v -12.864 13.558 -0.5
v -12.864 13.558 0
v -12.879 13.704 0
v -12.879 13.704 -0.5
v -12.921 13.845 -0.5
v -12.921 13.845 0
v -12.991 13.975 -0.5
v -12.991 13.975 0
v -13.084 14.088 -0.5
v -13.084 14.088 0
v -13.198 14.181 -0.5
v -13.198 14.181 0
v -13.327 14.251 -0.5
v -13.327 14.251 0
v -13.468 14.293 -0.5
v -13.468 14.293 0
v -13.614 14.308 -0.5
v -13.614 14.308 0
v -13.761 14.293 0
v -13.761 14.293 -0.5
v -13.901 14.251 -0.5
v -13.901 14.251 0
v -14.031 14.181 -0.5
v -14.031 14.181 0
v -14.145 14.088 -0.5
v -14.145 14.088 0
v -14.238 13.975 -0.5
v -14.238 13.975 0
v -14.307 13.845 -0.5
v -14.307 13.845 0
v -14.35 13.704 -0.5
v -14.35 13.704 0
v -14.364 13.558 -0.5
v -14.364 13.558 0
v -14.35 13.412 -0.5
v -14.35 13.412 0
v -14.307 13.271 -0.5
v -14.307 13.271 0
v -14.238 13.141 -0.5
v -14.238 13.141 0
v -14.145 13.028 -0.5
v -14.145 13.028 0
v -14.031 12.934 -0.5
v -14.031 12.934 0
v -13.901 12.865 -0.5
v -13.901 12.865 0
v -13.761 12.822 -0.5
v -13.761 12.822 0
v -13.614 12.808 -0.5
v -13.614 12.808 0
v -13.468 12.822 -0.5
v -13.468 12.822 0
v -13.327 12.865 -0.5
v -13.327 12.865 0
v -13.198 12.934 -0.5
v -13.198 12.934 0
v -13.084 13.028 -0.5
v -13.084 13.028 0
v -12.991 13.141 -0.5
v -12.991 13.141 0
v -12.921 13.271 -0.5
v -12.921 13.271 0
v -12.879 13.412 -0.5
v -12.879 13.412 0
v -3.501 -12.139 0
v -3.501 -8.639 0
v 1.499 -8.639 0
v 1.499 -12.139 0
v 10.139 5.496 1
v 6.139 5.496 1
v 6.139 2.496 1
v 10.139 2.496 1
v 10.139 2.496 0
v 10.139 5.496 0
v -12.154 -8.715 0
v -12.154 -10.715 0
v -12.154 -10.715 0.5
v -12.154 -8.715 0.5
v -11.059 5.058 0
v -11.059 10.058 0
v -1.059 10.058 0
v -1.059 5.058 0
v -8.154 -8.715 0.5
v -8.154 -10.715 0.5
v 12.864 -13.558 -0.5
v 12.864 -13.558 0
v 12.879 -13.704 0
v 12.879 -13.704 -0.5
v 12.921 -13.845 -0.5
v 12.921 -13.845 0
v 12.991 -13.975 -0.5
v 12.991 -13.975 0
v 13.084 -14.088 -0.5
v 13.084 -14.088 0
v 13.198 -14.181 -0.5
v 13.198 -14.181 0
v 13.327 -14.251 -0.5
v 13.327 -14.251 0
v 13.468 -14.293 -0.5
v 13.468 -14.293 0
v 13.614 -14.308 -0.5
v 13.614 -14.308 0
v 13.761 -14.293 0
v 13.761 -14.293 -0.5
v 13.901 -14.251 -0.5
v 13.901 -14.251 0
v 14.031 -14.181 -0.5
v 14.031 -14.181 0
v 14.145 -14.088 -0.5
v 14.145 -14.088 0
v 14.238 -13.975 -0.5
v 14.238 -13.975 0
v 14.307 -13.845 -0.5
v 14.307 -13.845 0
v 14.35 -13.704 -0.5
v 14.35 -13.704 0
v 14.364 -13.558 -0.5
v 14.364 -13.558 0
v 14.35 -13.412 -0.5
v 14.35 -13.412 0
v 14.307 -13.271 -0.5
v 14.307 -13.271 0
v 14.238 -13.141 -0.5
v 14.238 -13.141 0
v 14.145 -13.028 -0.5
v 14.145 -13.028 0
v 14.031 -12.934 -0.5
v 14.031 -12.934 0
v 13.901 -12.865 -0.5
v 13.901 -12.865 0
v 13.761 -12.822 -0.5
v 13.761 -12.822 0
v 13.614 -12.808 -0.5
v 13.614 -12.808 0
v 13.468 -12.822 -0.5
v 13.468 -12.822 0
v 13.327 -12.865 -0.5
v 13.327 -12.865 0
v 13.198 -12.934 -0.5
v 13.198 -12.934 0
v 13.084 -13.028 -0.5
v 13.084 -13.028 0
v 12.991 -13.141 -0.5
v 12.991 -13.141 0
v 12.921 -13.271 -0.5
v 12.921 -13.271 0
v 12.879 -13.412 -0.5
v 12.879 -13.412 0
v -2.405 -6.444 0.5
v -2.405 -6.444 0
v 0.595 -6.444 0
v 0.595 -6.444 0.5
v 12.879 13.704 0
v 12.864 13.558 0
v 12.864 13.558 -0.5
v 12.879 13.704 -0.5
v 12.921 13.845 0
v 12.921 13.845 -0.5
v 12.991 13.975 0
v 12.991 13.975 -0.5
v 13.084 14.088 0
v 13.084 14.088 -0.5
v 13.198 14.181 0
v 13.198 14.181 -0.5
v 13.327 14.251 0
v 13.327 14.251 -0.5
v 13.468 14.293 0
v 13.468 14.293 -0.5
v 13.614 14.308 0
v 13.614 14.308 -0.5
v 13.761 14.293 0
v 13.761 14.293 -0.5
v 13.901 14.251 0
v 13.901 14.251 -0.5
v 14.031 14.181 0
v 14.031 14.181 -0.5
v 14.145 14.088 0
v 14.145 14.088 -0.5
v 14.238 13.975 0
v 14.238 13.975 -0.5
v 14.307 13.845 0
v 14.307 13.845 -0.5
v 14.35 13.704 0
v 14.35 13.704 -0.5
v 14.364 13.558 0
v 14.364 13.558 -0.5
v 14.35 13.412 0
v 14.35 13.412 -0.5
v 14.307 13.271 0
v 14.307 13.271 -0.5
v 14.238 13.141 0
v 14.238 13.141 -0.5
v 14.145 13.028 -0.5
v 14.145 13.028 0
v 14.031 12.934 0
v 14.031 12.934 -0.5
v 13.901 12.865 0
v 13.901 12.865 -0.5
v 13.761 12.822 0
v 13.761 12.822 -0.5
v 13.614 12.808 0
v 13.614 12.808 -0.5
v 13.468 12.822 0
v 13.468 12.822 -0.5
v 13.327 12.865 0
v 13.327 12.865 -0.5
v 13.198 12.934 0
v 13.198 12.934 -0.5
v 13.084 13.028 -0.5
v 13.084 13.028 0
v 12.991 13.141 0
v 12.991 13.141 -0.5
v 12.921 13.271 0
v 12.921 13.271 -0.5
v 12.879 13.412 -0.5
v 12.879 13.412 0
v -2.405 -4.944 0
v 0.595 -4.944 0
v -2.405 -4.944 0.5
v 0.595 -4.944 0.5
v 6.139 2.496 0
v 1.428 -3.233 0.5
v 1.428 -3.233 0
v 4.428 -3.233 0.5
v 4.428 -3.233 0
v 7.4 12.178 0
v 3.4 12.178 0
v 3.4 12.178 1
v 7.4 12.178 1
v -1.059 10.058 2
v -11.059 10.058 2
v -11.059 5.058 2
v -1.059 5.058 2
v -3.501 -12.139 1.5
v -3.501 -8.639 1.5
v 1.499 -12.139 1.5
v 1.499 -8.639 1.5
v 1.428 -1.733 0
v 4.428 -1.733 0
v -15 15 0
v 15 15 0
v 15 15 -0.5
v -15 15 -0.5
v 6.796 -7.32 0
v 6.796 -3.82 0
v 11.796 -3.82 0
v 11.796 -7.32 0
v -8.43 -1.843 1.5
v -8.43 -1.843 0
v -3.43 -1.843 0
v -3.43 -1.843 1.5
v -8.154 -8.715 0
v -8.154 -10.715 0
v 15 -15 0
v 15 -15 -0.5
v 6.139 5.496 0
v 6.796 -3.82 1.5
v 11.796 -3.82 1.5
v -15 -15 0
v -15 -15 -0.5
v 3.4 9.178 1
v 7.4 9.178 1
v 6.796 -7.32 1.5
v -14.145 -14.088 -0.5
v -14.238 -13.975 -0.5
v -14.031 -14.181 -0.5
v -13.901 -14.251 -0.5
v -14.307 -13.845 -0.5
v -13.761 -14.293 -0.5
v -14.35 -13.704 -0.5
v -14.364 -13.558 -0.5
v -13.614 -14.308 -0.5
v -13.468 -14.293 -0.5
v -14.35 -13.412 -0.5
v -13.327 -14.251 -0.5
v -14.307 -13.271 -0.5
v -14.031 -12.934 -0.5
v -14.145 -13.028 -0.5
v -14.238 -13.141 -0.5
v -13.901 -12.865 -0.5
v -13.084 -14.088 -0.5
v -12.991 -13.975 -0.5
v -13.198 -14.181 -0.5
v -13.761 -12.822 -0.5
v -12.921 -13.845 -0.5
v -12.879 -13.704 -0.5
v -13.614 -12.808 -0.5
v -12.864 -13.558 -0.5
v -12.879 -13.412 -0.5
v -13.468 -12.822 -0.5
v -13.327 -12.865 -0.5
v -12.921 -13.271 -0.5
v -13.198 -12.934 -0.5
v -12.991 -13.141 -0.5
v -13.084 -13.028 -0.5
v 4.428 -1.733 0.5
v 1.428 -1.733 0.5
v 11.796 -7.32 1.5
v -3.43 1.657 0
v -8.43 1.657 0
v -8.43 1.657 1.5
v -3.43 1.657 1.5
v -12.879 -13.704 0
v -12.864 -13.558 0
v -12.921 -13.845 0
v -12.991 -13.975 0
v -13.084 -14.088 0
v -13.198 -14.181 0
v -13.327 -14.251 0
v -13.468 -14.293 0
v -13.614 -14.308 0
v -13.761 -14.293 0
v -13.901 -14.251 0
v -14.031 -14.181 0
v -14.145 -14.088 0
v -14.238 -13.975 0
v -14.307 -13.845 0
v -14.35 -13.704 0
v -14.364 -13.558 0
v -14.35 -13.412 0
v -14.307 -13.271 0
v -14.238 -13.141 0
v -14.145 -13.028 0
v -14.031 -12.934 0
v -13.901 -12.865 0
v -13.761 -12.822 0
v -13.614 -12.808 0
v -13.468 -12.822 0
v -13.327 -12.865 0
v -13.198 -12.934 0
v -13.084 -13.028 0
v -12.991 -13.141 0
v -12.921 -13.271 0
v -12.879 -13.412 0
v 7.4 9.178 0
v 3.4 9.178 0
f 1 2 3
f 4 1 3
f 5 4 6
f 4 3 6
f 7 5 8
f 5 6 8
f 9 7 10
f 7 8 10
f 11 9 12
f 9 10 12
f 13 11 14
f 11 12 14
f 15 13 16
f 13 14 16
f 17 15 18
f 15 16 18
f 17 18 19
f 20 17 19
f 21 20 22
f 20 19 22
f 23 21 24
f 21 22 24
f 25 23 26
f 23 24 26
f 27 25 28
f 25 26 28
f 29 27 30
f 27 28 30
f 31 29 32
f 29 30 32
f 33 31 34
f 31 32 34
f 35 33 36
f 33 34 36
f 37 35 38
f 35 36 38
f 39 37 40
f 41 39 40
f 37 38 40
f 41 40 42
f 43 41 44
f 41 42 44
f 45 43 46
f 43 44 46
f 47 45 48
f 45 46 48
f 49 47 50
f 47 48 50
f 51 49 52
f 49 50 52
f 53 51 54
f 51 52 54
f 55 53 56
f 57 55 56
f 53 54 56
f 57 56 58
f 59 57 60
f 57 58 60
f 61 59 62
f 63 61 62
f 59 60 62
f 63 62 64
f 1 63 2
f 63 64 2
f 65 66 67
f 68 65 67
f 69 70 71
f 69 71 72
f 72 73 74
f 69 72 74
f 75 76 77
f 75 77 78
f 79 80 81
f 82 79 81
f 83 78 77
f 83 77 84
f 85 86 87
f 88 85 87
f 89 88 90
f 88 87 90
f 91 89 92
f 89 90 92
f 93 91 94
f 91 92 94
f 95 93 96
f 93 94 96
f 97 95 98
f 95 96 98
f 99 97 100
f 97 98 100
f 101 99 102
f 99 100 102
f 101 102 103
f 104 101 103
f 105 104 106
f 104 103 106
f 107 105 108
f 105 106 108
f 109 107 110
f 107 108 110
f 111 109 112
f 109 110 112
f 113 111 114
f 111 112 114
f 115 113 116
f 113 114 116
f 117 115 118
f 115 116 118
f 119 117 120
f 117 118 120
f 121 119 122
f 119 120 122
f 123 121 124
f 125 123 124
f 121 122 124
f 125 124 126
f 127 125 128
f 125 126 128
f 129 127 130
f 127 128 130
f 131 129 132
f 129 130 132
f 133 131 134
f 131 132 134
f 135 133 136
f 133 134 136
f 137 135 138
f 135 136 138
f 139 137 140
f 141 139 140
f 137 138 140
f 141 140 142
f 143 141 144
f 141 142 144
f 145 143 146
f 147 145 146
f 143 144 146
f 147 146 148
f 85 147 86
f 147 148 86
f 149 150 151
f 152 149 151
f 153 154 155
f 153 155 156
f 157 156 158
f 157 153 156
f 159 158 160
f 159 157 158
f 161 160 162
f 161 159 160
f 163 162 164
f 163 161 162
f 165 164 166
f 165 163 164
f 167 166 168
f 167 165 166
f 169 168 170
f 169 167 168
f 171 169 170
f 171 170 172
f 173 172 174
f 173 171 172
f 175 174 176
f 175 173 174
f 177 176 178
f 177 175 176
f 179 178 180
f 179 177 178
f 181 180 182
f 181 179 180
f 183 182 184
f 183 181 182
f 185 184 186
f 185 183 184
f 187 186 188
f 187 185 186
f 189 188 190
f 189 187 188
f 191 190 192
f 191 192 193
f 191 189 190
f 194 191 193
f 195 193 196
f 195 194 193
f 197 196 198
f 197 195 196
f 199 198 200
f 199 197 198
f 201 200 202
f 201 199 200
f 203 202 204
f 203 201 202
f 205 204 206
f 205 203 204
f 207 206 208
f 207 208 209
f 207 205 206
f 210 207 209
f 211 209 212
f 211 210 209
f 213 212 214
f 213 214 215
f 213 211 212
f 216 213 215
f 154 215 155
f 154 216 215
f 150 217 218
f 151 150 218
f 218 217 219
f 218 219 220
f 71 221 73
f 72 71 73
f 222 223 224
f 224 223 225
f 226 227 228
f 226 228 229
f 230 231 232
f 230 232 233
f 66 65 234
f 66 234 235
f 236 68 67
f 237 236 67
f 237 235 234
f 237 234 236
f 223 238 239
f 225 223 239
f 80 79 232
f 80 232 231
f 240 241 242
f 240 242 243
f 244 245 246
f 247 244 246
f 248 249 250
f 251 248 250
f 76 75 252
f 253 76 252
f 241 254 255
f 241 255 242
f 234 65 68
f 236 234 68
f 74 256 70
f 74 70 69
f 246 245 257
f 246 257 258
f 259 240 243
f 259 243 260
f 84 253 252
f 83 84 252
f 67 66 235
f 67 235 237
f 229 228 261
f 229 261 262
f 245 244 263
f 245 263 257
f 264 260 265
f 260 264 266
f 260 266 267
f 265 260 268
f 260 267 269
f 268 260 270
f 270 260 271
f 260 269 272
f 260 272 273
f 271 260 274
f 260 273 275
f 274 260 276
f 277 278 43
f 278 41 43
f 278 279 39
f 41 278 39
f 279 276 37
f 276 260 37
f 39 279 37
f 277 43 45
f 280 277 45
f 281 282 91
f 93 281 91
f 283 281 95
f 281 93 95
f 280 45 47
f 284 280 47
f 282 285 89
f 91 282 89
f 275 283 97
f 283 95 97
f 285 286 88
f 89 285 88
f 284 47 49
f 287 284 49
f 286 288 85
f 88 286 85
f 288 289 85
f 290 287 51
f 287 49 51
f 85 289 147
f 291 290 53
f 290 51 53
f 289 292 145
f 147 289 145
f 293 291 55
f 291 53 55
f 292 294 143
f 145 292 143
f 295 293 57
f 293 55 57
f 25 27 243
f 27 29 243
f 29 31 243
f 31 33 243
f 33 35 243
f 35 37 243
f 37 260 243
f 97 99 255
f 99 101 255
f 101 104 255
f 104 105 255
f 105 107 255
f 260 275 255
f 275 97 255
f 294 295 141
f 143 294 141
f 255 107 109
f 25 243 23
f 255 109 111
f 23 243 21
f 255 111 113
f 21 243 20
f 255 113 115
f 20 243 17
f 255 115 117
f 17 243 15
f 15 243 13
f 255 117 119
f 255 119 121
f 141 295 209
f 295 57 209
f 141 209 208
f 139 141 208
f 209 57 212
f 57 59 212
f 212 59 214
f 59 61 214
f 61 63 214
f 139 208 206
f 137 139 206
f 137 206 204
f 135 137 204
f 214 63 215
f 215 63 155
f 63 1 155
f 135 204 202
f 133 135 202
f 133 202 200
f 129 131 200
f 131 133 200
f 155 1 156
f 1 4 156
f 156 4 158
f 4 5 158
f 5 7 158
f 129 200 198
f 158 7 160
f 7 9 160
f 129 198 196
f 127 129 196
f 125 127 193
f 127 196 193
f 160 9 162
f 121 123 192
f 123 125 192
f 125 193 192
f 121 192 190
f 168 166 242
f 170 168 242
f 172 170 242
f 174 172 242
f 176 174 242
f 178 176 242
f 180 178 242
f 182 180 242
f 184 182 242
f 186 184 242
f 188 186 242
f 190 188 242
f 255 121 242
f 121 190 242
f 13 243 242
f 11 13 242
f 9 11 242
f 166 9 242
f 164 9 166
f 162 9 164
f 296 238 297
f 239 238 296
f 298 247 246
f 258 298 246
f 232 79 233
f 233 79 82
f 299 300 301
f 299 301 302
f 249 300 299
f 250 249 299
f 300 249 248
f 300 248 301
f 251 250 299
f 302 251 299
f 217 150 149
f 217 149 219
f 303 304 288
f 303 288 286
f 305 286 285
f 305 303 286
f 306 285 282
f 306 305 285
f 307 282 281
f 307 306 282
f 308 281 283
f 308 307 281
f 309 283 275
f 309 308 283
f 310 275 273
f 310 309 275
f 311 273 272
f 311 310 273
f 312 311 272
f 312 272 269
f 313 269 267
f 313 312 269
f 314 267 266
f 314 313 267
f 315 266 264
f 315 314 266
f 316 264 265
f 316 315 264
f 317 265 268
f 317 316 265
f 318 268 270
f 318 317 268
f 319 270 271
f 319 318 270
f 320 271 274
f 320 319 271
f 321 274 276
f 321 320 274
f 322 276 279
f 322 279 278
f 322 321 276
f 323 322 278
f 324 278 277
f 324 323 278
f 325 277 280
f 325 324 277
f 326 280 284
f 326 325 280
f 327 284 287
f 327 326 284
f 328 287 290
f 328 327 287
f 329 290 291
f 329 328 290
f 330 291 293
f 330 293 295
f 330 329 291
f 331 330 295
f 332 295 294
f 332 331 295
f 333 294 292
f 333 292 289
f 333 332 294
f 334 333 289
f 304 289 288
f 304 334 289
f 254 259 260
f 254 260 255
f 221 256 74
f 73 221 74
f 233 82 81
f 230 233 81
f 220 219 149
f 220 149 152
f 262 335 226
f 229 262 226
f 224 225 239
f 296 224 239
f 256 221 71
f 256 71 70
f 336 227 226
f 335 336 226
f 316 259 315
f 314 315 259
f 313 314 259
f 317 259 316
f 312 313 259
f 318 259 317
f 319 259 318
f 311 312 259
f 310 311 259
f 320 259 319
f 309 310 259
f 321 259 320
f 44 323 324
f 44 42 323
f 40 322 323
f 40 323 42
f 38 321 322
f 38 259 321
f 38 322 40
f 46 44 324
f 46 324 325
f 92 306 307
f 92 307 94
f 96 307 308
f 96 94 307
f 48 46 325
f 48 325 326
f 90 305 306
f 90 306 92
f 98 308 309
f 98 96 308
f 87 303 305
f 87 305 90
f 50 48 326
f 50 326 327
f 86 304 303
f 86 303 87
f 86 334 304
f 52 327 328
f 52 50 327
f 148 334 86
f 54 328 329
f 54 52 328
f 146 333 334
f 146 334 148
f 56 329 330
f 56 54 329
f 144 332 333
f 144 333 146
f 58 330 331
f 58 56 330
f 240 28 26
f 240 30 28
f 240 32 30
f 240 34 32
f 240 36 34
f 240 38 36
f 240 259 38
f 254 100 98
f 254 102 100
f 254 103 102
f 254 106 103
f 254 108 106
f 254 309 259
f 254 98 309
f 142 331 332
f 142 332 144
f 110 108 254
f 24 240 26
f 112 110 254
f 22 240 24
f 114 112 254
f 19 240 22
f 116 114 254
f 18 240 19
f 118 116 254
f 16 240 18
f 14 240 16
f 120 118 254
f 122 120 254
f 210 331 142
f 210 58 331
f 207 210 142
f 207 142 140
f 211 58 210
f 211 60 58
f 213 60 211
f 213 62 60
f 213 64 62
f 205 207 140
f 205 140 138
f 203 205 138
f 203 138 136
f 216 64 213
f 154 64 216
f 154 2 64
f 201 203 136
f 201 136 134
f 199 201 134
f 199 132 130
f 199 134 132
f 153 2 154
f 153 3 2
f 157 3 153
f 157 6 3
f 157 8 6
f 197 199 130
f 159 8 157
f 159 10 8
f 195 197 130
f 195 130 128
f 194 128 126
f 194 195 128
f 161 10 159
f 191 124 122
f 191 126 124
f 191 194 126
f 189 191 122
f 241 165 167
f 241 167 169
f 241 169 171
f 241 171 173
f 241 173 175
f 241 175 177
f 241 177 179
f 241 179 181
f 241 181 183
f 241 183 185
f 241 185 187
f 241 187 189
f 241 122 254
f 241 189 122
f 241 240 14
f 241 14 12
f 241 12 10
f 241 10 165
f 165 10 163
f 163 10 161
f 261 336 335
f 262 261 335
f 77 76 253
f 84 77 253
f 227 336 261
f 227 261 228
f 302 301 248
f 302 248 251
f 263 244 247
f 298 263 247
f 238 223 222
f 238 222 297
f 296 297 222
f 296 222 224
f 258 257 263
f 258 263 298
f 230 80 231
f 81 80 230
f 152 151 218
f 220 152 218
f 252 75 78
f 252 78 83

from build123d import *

# Parameters (mm, degrees)
F0_W      = 4
F0_H      = 2
F0_W_2    = 5
F0_H_2    = 3.5
F0_W_3    = 3
F0_H_3    = 1.5
F0_R      = 0.75
F0_W_4    = 10
F0_H_4    = 5
F0_H_5    = 3
F1_DEPTH  = 0.5
F2_DEPTH  = 0.5
F7_DEPTH  = 2
F8_DEPTH  = 1.5
F9_DEPTH  = 1
F10_DEPTH = 0.5


# Not quite as in the source:
# - the program builds the solid bodies; features that only make, move or delete a surface that nothing else refers to are left out


with BuildPart() as f1:
    # F0 (on Top) → F1 (new body)
    with BuildSketch(Plane.XY):
        Polygon((15, 15), (0, 15), (-15, 15), (-15, 0), (-15, -15), (15, -15), (15, 0), align=None)
        with Locations((-10.1540855616, -9.7154753059)):
            Rectangle(F0_W, F0_H, mode=Mode.SUBTRACT)
        with Locations((-1.0007002298, -10.3894498274)):
            Rectangle(F0_W_2, F0_H_2, mode=Mode.SUBTRACT)
        with Locations((-0.9053347297, -5.6935508102)):
            Rectangle(F0_W_3, F0_H_3, mode=Mode.SUBTRACT)
        with Locations((-5.9298439324, -0.0930169439)):
            Rectangle(F0_W_2, F0_H_2, mode=Mode.SUBTRACT)
        with Locations((2.9284434728, -2.4834803706)):
            Rectangle(F0_W_3, F0_H_3, mode=Mode.SUBTRACT)
        with Locations((9.2957332358, -5.5698433965)):
            Rectangle(F0_W_2, F0_H_2, mode=Mode.SUBTRACT)
        with Locations((-13.6142675997, 13.55786765)):
            Circle(F0_R, mode=Mode.SUBTRACT)
        with Locations((-6.0587198287, 7.557784263)):
            Rectangle(F0_W_4, F0_H_4, mode=Mode.SUBTRACT)
        with Locations((8.1385142617, 3.9959300905)):
            Rectangle(F0_W, F0_H_5, mode=Mode.SUBTRACT)
        with Locations((5.4001008607, 10.6776582673)):
            Rectangle(F0_W, F0_H_5, mode=Mode.SUBTRACT)
        with Locations((-6.0587198287, 7.557784263)):
            Rectangle(F0_W_4, F0_H_4)
        with Locations((-5.9298439324, -0.0930169439)):
            Rectangle(F0_W_2, F0_H_2)
        with Locations((-10.1540855616, -9.7154753059)):
            Rectangle(F0_W, F0_H)
        with Locations((-1.0007002298, -10.3894498274)):
            Rectangle(F0_W_2, F0_H_2)
        with Locations((-0.9053347297, -5.6935508102)):
            Rectangle(F0_W_3, F0_H_3)
        with Locations((2.9284434728, -2.4834803706)):
            Rectangle(F0_W_3, F0_H_3)
        with Locations((9.2957332358, -5.5698433965)):
            Rectangle(F0_W_2, F0_H_2)
        with Locations((8.1385142617, 3.9959300905)):
            Rectangle(F0_W, F0_H_5)
        with Locations((5.4001008607, 10.6776582673)):
            Rectangle(F0_W, F0_H_5)
    extrude(amount=-F1_DEPTH)


with BuildPart() as f2:
    # F0 (on Top) → F2 (new body, through all)
    with BuildSketch(Plane.XY):
        with Locations((-13.6142675997, 13.55786765)):
            Circle(F0_R)
    extrude(amount=-F2_DEPTH)


with BuildPart() as f3_1:
    # F3: instance of F2
    add(f2.part.mirror(Plane.XZ))


with BuildPart() as f4_1:
    # F4: instance of F2
    add(f2.part.mirror(Plane.YZ))


with BuildPart() as f4_2:
    # F4: instance of F3_1
    add(f3_1.part.mirror(Plane.YZ))


with BuildPart() as f1_1:
    add(f1.part)

    # F5: cut F3_1, F4_1, F4_2
    add(f3_1.part, mode=Mode.SUBTRACT)
    add(f4_1.part, mode=Mode.SUBTRACT)
    add(f4_2.part, mode=Mode.SUBTRACT)


with BuildPart() as f7:
    # F0 (on Top) → F7 (new body)
    with BuildSketch(Plane.XY):
        with Locations((-6.0587198287, 7.557784263)):
            Rectangle(F0_W_4, F0_H_4)
    extrude(amount=F7_DEPTH)


with BuildPart() as f8:
    # F0 (on Top) → F8 (new body)
    with BuildSketch(Plane.XY):
        with Locations((-5.9298439324, -0.0930169439)):
            Rectangle(F0_W_2, F0_H_2)
    extrude(amount=F8_DEPTH)


with BuildPart() as f8b:
    # F0 (on Top) → F8, piece 2 (new body)
    with BuildSketch(Plane.XY):
        with Locations((-1.0007002298, -10.3894498274)):
            Rectangle(F0_W_2, F0_H_2)
    extrude(amount=F8_DEPTH)


with BuildPart() as f8c:
    # F0 (on Top) → F8, piece 3 (new body)
    with BuildSketch(Plane.XY):
        with Locations((9.2957332358, -5.5698433965)):
            Rectangle(F0_W_2, F0_H_2)
    extrude(amount=F8_DEPTH)


with BuildPart() as f9:
    # F0 (on Top) → F9 (new body)
    with BuildSketch(Plane.XY):
        with Locations((8.1385142617, 3.9959300905)):
            Rectangle(F0_W, F0_H_5)
    extrude(amount=F9_DEPTH)


with BuildPart() as f9b:
    # F0 (on Top) → F9, piece 2 (new body)
    with BuildSketch(Plane.XY):
        with Locations((5.4001008607, 10.6776582673)):
            Rectangle(F0_W, F0_H_5)
    extrude(amount=F9_DEPTH)


with BuildPart() as f10:
    # F0 (on Top) → F10 (new body)
    with BuildSketch(Plane.XY):
        with Locations((-0.9053347297, -5.6935508102)):
            Rectangle(F0_W_3, F0_H_3)
    extrude(amount=F10_DEPTH)


with BuildPart() as f10b:
    # F0 (on Top) → F10, piece 2 (new body)
    with BuildSketch(Plane.XY):
        with Locations((2.9284434728, -2.4834803706)):
            Rectangle(F0_W_3, F0_H_3)
    extrude(amount=F10_DEPTH)


with BuildPart() as f10c:
    # F0 (on Top) → F10, piece 3 (new body)
    with BuildSketch(Plane.XY):
        with Locations((-10.1540855616, -9.7154753059)):
            Rectangle(F0_W, F0_H)
    extrude(amount=F10_DEPTH)


solid = Compound([f1_1.part, f7.part, f8.part, f8b.part, f8c.part, f9.part, f9b.part, f10.part, f10b.part, f10c.part])
